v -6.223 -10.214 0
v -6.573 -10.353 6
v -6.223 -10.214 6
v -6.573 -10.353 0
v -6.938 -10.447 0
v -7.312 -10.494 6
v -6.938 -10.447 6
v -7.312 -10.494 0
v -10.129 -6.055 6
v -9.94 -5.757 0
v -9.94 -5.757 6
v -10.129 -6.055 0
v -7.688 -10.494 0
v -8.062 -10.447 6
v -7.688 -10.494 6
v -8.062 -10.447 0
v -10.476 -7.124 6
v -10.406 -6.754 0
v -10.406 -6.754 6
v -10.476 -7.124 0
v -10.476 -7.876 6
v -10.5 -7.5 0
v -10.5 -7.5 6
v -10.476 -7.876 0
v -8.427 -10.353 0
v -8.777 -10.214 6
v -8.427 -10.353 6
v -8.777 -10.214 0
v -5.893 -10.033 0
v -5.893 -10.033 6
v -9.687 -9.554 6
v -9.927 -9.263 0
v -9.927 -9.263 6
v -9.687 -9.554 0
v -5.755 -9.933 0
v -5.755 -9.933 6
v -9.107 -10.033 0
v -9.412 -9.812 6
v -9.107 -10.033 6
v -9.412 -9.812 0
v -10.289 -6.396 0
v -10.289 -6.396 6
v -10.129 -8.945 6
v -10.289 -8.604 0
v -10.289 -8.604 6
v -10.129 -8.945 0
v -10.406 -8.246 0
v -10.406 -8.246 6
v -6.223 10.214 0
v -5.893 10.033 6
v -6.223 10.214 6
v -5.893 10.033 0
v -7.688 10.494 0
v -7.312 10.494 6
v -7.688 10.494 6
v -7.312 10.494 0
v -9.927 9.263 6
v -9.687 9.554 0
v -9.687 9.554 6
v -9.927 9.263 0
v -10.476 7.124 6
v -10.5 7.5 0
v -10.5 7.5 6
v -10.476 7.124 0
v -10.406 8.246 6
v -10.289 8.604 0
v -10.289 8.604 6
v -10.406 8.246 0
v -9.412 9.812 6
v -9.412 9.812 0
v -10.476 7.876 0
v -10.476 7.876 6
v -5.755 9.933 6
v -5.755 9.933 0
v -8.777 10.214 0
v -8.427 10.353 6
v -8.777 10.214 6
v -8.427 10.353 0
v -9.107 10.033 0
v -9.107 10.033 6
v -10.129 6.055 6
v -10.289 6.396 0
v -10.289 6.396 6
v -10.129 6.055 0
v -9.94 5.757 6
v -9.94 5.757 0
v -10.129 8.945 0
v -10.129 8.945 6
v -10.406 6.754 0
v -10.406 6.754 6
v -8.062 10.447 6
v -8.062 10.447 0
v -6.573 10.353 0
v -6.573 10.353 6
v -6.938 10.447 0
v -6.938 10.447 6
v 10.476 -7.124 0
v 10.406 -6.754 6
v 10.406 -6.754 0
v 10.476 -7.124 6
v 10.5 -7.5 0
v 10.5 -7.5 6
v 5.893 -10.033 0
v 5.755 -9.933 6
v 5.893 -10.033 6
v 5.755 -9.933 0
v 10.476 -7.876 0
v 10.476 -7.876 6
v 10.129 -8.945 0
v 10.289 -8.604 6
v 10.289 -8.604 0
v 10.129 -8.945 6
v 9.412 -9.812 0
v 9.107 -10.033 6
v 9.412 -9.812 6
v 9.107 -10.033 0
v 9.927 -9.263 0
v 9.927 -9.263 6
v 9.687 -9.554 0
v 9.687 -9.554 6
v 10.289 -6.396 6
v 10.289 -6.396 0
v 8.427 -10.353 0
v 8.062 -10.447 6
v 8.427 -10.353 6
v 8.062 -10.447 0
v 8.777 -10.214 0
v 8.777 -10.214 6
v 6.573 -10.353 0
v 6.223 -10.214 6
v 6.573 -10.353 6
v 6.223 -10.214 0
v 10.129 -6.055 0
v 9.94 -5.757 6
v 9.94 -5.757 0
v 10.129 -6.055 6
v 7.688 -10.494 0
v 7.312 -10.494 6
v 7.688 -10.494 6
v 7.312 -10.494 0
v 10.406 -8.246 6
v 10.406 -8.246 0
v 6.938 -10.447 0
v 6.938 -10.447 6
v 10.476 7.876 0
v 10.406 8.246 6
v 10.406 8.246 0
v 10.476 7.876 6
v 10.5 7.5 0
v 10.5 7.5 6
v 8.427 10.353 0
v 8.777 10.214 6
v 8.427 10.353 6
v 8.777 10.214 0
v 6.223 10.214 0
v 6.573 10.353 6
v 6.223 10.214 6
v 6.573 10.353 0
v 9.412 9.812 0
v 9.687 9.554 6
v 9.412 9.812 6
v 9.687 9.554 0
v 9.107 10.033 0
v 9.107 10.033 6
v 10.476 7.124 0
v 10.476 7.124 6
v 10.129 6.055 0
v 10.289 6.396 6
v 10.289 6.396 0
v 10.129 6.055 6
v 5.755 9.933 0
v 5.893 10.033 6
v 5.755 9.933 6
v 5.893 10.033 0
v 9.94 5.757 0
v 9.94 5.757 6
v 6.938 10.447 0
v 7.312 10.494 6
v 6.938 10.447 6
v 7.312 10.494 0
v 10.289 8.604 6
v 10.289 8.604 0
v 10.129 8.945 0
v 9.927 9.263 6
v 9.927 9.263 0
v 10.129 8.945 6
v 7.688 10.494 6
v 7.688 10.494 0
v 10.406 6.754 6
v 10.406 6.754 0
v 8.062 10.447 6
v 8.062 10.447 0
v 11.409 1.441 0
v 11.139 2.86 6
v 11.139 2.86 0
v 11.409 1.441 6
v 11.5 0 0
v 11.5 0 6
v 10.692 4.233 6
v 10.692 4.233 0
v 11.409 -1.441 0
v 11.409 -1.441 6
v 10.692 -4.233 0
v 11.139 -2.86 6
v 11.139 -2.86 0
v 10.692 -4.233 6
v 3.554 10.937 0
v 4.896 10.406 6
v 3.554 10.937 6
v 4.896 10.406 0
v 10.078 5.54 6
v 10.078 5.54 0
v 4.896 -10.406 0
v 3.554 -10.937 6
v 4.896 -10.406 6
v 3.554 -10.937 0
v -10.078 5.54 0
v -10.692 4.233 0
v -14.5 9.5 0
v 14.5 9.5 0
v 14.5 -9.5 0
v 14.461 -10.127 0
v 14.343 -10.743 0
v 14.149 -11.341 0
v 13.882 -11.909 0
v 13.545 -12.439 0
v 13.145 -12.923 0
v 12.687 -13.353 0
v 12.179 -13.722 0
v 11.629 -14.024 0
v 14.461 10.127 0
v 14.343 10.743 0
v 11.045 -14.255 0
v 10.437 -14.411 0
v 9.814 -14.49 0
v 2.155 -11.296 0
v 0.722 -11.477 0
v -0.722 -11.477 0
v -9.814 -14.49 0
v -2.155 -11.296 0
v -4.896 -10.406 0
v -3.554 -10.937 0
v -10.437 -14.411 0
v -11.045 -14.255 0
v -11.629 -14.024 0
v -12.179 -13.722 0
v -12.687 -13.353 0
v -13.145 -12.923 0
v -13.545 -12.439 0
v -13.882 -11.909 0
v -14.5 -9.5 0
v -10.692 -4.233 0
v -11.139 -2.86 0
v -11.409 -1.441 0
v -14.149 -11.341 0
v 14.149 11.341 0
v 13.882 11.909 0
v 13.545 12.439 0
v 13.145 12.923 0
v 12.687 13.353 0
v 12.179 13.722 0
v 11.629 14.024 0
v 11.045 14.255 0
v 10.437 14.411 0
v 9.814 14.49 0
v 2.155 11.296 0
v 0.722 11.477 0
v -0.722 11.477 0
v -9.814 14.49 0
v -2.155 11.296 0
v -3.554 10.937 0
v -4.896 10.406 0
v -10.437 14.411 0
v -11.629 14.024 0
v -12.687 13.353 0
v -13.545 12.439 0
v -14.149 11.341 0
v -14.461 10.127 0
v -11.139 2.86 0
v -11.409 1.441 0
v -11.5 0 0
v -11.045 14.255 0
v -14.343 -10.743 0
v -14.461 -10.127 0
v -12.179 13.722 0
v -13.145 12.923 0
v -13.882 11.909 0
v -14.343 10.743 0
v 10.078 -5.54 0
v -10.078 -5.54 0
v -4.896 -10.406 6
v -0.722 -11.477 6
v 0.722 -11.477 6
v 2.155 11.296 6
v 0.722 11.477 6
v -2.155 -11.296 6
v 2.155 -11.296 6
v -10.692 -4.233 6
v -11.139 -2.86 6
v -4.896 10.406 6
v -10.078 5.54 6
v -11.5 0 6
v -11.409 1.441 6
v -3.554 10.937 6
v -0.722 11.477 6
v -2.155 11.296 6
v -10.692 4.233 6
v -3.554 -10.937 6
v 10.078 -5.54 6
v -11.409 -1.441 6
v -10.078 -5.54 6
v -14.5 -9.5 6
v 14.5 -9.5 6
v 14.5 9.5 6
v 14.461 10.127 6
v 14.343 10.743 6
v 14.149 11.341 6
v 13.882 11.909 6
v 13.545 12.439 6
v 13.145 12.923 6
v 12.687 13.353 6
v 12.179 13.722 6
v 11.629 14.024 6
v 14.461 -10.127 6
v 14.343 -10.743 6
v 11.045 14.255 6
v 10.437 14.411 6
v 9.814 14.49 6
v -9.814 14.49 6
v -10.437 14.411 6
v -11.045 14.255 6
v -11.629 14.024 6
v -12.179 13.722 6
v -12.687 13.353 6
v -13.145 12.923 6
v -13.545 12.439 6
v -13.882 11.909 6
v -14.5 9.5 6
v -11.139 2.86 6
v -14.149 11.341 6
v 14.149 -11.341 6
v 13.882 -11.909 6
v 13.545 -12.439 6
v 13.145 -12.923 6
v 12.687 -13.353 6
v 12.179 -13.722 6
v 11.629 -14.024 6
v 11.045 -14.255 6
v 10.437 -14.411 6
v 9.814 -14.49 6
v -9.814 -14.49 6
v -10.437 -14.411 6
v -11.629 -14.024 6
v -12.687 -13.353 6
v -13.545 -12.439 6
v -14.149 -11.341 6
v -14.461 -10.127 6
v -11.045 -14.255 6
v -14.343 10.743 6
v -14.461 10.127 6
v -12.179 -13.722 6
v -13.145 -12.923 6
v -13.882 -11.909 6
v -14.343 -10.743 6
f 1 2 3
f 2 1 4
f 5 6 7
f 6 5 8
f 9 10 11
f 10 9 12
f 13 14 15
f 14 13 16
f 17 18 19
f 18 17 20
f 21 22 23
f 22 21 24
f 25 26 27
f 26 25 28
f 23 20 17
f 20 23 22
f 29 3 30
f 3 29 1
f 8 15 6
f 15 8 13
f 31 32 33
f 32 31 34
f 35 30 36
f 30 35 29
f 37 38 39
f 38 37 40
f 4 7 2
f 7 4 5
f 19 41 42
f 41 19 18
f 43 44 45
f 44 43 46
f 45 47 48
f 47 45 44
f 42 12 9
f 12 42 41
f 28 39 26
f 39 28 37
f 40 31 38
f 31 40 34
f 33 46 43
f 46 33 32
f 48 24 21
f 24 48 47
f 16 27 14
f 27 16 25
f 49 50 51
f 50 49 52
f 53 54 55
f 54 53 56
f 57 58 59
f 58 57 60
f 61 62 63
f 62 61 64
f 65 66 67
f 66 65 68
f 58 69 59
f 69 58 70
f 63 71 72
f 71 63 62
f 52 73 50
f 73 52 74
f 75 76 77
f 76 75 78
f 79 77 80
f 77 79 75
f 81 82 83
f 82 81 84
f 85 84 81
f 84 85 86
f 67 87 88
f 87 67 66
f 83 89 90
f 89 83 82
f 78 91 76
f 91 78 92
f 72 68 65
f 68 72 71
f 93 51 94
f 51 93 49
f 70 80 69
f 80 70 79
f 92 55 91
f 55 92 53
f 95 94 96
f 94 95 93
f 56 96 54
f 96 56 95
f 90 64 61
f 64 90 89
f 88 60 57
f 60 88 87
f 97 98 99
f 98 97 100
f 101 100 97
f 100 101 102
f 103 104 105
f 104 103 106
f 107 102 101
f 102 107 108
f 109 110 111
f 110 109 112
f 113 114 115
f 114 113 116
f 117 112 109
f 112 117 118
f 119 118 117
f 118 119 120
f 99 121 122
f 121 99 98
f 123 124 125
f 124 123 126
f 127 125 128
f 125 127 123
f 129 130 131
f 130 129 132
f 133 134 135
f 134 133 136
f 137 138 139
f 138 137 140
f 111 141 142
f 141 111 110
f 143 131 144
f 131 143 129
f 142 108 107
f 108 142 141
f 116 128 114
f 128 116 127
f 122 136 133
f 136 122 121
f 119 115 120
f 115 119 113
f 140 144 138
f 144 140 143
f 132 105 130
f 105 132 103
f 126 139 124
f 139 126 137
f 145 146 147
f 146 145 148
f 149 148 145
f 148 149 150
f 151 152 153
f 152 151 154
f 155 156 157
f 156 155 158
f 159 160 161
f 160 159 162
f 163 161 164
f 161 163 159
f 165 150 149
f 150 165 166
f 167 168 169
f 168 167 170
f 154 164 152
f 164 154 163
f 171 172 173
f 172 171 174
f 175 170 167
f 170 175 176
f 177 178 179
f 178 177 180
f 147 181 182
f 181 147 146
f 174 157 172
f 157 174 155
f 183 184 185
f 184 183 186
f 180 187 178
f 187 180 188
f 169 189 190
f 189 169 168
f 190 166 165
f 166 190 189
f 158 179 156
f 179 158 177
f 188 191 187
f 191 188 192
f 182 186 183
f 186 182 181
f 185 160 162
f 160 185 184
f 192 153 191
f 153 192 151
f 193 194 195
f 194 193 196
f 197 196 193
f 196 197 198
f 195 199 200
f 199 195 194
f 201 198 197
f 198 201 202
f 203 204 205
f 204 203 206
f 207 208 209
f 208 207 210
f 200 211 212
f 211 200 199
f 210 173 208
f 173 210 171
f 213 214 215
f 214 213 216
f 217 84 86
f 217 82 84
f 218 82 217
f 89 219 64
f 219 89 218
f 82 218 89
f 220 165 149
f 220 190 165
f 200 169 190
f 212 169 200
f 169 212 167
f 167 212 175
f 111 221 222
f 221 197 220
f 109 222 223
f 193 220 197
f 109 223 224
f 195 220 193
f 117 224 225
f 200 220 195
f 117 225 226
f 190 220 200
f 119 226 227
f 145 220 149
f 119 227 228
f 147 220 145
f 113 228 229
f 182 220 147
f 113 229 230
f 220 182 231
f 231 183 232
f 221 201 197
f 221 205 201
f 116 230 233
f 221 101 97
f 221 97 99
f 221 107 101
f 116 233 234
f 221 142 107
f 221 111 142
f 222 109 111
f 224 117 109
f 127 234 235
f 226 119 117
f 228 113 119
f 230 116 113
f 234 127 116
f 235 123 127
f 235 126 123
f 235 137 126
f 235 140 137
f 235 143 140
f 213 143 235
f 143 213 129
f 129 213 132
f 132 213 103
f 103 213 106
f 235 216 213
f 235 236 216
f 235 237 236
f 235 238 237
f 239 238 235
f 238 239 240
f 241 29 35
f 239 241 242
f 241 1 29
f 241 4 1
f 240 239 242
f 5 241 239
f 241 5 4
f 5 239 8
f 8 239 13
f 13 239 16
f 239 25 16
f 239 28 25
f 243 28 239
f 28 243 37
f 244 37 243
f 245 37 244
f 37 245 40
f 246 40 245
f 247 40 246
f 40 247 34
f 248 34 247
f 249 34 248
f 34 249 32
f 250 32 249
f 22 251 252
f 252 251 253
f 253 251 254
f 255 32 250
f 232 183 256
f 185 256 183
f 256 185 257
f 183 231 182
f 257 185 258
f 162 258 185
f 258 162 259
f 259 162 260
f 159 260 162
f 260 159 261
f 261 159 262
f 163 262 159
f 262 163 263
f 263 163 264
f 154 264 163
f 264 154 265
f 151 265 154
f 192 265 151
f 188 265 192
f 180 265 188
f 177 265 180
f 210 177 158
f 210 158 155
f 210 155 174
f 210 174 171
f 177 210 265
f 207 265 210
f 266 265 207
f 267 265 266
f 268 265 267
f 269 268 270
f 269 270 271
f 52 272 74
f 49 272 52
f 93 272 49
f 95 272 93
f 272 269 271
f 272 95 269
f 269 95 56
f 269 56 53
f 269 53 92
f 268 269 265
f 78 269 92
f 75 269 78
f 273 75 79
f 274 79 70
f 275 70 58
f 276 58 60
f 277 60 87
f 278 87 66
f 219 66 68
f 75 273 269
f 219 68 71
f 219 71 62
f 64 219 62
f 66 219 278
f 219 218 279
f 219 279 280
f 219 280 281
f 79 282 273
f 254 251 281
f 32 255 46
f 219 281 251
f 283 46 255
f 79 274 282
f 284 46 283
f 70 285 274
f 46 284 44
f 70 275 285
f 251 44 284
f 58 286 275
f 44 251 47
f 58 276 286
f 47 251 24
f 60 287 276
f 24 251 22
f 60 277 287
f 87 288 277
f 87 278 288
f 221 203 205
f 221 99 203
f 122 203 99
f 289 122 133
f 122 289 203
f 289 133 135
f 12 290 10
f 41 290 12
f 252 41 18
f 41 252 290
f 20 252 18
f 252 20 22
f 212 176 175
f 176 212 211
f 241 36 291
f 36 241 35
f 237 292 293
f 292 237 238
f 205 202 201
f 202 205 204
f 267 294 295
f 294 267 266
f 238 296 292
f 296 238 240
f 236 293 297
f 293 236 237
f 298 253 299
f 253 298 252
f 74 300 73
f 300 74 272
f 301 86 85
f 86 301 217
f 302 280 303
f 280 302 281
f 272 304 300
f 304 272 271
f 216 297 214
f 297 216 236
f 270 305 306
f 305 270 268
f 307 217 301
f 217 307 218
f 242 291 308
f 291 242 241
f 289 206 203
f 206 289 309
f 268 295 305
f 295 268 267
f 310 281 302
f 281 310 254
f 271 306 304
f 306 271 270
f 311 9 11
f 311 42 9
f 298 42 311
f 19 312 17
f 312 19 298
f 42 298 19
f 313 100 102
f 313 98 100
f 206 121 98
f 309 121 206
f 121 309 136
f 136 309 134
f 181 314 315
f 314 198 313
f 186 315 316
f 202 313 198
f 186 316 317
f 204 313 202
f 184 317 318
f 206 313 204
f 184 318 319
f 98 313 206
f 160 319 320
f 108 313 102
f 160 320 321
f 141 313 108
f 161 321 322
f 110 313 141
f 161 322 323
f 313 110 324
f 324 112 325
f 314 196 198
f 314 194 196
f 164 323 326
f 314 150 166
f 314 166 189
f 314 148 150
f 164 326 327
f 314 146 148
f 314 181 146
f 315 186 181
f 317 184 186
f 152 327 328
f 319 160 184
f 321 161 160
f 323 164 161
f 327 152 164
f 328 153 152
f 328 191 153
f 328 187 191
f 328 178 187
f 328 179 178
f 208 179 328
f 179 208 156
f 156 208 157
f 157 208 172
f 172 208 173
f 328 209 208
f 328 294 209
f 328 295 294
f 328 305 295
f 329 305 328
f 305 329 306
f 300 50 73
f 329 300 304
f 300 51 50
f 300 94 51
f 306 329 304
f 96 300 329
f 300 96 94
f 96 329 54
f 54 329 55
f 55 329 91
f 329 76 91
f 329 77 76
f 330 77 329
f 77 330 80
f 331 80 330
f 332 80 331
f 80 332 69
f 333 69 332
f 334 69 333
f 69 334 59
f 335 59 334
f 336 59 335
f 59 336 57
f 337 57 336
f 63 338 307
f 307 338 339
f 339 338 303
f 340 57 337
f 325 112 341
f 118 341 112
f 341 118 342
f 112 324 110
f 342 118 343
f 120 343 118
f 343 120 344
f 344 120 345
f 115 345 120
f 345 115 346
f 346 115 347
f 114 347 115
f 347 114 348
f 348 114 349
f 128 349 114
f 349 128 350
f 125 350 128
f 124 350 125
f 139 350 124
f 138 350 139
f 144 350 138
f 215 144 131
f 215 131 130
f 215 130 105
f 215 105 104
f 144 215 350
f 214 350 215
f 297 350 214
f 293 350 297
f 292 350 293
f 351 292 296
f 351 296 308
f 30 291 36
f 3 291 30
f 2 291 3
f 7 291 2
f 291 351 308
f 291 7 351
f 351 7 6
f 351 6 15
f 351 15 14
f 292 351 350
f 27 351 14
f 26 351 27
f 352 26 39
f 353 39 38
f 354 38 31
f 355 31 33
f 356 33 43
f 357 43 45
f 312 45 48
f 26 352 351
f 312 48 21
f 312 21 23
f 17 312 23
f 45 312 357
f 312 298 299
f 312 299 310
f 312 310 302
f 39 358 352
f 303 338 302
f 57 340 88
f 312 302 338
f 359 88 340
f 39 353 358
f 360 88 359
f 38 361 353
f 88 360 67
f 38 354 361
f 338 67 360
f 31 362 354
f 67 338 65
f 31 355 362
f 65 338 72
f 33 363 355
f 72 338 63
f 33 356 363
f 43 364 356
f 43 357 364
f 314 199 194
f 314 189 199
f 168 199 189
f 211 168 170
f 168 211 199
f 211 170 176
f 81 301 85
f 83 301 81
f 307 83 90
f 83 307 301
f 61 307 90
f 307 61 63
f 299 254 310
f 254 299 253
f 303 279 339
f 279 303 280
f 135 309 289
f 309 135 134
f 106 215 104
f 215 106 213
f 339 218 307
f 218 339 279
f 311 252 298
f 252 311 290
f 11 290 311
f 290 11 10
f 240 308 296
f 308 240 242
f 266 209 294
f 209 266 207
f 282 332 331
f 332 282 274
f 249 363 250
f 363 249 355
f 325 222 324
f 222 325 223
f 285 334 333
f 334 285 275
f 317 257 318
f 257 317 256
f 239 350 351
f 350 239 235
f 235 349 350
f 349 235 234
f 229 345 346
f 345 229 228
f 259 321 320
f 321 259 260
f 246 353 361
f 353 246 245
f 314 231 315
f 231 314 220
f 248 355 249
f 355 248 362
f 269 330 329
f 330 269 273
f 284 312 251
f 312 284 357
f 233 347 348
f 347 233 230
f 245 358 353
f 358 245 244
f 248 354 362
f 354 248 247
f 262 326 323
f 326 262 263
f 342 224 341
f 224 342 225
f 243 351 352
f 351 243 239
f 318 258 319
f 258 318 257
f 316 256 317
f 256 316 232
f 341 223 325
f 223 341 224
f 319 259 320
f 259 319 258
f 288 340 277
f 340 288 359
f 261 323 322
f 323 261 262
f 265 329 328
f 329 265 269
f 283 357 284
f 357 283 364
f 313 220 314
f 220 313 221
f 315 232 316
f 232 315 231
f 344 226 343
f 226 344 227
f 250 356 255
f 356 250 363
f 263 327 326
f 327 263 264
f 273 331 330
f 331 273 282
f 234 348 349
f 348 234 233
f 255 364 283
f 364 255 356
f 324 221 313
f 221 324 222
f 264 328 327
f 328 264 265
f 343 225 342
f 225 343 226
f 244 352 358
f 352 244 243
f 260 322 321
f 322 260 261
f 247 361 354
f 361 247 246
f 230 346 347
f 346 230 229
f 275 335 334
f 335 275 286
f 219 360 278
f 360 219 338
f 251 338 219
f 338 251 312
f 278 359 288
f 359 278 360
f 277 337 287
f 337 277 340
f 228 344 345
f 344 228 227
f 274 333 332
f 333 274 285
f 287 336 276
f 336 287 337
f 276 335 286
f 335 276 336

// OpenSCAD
$fn = 50;


difference() {
	union() {
		hull() {
			translate(v = [-9.5000000000, 9.5000000000, 0]) {
				cylinder(h = 6, r = 5);
			}
			translate(v = [9.5000000000, 9.5000000000, 0]) {
				cylinder(h = 6, r = 5);
			}
			translate(v = [-9.5000000000, -9.5000000000, 0]) {
				cylinder(h = 6, r = 5);
			}
			translate(v = [9.5000000000, -9.5000000000, 0]) {
				cylinder(h = 6, r = 5);
			}
		}
	}
	union() {
		#translate(v = [-7.5000000000, -7.5000000000, -100.0000000000]) {
			cylinder(h = 200, r = 3.0000000000);
		}
		#translate(v = [-7.5000000000, 7.5000000000, -100.0000000000]) {
			cylinder(h = 200, r = 3.0000000000);
		}
		#translate(v = [7.5000000000, -7.5000000000, -100.0000000000]) {
			cylinder(h = 200, r = 3.0000000000);
		}
		#translate(v = [7.5000000000, 7.5000000000, -100.0000000000]) {
			cylinder(h = 200, r = 3.0000000000);
		}
		#cylinder(h = 6, r = 11.5000000000);
	}
}
